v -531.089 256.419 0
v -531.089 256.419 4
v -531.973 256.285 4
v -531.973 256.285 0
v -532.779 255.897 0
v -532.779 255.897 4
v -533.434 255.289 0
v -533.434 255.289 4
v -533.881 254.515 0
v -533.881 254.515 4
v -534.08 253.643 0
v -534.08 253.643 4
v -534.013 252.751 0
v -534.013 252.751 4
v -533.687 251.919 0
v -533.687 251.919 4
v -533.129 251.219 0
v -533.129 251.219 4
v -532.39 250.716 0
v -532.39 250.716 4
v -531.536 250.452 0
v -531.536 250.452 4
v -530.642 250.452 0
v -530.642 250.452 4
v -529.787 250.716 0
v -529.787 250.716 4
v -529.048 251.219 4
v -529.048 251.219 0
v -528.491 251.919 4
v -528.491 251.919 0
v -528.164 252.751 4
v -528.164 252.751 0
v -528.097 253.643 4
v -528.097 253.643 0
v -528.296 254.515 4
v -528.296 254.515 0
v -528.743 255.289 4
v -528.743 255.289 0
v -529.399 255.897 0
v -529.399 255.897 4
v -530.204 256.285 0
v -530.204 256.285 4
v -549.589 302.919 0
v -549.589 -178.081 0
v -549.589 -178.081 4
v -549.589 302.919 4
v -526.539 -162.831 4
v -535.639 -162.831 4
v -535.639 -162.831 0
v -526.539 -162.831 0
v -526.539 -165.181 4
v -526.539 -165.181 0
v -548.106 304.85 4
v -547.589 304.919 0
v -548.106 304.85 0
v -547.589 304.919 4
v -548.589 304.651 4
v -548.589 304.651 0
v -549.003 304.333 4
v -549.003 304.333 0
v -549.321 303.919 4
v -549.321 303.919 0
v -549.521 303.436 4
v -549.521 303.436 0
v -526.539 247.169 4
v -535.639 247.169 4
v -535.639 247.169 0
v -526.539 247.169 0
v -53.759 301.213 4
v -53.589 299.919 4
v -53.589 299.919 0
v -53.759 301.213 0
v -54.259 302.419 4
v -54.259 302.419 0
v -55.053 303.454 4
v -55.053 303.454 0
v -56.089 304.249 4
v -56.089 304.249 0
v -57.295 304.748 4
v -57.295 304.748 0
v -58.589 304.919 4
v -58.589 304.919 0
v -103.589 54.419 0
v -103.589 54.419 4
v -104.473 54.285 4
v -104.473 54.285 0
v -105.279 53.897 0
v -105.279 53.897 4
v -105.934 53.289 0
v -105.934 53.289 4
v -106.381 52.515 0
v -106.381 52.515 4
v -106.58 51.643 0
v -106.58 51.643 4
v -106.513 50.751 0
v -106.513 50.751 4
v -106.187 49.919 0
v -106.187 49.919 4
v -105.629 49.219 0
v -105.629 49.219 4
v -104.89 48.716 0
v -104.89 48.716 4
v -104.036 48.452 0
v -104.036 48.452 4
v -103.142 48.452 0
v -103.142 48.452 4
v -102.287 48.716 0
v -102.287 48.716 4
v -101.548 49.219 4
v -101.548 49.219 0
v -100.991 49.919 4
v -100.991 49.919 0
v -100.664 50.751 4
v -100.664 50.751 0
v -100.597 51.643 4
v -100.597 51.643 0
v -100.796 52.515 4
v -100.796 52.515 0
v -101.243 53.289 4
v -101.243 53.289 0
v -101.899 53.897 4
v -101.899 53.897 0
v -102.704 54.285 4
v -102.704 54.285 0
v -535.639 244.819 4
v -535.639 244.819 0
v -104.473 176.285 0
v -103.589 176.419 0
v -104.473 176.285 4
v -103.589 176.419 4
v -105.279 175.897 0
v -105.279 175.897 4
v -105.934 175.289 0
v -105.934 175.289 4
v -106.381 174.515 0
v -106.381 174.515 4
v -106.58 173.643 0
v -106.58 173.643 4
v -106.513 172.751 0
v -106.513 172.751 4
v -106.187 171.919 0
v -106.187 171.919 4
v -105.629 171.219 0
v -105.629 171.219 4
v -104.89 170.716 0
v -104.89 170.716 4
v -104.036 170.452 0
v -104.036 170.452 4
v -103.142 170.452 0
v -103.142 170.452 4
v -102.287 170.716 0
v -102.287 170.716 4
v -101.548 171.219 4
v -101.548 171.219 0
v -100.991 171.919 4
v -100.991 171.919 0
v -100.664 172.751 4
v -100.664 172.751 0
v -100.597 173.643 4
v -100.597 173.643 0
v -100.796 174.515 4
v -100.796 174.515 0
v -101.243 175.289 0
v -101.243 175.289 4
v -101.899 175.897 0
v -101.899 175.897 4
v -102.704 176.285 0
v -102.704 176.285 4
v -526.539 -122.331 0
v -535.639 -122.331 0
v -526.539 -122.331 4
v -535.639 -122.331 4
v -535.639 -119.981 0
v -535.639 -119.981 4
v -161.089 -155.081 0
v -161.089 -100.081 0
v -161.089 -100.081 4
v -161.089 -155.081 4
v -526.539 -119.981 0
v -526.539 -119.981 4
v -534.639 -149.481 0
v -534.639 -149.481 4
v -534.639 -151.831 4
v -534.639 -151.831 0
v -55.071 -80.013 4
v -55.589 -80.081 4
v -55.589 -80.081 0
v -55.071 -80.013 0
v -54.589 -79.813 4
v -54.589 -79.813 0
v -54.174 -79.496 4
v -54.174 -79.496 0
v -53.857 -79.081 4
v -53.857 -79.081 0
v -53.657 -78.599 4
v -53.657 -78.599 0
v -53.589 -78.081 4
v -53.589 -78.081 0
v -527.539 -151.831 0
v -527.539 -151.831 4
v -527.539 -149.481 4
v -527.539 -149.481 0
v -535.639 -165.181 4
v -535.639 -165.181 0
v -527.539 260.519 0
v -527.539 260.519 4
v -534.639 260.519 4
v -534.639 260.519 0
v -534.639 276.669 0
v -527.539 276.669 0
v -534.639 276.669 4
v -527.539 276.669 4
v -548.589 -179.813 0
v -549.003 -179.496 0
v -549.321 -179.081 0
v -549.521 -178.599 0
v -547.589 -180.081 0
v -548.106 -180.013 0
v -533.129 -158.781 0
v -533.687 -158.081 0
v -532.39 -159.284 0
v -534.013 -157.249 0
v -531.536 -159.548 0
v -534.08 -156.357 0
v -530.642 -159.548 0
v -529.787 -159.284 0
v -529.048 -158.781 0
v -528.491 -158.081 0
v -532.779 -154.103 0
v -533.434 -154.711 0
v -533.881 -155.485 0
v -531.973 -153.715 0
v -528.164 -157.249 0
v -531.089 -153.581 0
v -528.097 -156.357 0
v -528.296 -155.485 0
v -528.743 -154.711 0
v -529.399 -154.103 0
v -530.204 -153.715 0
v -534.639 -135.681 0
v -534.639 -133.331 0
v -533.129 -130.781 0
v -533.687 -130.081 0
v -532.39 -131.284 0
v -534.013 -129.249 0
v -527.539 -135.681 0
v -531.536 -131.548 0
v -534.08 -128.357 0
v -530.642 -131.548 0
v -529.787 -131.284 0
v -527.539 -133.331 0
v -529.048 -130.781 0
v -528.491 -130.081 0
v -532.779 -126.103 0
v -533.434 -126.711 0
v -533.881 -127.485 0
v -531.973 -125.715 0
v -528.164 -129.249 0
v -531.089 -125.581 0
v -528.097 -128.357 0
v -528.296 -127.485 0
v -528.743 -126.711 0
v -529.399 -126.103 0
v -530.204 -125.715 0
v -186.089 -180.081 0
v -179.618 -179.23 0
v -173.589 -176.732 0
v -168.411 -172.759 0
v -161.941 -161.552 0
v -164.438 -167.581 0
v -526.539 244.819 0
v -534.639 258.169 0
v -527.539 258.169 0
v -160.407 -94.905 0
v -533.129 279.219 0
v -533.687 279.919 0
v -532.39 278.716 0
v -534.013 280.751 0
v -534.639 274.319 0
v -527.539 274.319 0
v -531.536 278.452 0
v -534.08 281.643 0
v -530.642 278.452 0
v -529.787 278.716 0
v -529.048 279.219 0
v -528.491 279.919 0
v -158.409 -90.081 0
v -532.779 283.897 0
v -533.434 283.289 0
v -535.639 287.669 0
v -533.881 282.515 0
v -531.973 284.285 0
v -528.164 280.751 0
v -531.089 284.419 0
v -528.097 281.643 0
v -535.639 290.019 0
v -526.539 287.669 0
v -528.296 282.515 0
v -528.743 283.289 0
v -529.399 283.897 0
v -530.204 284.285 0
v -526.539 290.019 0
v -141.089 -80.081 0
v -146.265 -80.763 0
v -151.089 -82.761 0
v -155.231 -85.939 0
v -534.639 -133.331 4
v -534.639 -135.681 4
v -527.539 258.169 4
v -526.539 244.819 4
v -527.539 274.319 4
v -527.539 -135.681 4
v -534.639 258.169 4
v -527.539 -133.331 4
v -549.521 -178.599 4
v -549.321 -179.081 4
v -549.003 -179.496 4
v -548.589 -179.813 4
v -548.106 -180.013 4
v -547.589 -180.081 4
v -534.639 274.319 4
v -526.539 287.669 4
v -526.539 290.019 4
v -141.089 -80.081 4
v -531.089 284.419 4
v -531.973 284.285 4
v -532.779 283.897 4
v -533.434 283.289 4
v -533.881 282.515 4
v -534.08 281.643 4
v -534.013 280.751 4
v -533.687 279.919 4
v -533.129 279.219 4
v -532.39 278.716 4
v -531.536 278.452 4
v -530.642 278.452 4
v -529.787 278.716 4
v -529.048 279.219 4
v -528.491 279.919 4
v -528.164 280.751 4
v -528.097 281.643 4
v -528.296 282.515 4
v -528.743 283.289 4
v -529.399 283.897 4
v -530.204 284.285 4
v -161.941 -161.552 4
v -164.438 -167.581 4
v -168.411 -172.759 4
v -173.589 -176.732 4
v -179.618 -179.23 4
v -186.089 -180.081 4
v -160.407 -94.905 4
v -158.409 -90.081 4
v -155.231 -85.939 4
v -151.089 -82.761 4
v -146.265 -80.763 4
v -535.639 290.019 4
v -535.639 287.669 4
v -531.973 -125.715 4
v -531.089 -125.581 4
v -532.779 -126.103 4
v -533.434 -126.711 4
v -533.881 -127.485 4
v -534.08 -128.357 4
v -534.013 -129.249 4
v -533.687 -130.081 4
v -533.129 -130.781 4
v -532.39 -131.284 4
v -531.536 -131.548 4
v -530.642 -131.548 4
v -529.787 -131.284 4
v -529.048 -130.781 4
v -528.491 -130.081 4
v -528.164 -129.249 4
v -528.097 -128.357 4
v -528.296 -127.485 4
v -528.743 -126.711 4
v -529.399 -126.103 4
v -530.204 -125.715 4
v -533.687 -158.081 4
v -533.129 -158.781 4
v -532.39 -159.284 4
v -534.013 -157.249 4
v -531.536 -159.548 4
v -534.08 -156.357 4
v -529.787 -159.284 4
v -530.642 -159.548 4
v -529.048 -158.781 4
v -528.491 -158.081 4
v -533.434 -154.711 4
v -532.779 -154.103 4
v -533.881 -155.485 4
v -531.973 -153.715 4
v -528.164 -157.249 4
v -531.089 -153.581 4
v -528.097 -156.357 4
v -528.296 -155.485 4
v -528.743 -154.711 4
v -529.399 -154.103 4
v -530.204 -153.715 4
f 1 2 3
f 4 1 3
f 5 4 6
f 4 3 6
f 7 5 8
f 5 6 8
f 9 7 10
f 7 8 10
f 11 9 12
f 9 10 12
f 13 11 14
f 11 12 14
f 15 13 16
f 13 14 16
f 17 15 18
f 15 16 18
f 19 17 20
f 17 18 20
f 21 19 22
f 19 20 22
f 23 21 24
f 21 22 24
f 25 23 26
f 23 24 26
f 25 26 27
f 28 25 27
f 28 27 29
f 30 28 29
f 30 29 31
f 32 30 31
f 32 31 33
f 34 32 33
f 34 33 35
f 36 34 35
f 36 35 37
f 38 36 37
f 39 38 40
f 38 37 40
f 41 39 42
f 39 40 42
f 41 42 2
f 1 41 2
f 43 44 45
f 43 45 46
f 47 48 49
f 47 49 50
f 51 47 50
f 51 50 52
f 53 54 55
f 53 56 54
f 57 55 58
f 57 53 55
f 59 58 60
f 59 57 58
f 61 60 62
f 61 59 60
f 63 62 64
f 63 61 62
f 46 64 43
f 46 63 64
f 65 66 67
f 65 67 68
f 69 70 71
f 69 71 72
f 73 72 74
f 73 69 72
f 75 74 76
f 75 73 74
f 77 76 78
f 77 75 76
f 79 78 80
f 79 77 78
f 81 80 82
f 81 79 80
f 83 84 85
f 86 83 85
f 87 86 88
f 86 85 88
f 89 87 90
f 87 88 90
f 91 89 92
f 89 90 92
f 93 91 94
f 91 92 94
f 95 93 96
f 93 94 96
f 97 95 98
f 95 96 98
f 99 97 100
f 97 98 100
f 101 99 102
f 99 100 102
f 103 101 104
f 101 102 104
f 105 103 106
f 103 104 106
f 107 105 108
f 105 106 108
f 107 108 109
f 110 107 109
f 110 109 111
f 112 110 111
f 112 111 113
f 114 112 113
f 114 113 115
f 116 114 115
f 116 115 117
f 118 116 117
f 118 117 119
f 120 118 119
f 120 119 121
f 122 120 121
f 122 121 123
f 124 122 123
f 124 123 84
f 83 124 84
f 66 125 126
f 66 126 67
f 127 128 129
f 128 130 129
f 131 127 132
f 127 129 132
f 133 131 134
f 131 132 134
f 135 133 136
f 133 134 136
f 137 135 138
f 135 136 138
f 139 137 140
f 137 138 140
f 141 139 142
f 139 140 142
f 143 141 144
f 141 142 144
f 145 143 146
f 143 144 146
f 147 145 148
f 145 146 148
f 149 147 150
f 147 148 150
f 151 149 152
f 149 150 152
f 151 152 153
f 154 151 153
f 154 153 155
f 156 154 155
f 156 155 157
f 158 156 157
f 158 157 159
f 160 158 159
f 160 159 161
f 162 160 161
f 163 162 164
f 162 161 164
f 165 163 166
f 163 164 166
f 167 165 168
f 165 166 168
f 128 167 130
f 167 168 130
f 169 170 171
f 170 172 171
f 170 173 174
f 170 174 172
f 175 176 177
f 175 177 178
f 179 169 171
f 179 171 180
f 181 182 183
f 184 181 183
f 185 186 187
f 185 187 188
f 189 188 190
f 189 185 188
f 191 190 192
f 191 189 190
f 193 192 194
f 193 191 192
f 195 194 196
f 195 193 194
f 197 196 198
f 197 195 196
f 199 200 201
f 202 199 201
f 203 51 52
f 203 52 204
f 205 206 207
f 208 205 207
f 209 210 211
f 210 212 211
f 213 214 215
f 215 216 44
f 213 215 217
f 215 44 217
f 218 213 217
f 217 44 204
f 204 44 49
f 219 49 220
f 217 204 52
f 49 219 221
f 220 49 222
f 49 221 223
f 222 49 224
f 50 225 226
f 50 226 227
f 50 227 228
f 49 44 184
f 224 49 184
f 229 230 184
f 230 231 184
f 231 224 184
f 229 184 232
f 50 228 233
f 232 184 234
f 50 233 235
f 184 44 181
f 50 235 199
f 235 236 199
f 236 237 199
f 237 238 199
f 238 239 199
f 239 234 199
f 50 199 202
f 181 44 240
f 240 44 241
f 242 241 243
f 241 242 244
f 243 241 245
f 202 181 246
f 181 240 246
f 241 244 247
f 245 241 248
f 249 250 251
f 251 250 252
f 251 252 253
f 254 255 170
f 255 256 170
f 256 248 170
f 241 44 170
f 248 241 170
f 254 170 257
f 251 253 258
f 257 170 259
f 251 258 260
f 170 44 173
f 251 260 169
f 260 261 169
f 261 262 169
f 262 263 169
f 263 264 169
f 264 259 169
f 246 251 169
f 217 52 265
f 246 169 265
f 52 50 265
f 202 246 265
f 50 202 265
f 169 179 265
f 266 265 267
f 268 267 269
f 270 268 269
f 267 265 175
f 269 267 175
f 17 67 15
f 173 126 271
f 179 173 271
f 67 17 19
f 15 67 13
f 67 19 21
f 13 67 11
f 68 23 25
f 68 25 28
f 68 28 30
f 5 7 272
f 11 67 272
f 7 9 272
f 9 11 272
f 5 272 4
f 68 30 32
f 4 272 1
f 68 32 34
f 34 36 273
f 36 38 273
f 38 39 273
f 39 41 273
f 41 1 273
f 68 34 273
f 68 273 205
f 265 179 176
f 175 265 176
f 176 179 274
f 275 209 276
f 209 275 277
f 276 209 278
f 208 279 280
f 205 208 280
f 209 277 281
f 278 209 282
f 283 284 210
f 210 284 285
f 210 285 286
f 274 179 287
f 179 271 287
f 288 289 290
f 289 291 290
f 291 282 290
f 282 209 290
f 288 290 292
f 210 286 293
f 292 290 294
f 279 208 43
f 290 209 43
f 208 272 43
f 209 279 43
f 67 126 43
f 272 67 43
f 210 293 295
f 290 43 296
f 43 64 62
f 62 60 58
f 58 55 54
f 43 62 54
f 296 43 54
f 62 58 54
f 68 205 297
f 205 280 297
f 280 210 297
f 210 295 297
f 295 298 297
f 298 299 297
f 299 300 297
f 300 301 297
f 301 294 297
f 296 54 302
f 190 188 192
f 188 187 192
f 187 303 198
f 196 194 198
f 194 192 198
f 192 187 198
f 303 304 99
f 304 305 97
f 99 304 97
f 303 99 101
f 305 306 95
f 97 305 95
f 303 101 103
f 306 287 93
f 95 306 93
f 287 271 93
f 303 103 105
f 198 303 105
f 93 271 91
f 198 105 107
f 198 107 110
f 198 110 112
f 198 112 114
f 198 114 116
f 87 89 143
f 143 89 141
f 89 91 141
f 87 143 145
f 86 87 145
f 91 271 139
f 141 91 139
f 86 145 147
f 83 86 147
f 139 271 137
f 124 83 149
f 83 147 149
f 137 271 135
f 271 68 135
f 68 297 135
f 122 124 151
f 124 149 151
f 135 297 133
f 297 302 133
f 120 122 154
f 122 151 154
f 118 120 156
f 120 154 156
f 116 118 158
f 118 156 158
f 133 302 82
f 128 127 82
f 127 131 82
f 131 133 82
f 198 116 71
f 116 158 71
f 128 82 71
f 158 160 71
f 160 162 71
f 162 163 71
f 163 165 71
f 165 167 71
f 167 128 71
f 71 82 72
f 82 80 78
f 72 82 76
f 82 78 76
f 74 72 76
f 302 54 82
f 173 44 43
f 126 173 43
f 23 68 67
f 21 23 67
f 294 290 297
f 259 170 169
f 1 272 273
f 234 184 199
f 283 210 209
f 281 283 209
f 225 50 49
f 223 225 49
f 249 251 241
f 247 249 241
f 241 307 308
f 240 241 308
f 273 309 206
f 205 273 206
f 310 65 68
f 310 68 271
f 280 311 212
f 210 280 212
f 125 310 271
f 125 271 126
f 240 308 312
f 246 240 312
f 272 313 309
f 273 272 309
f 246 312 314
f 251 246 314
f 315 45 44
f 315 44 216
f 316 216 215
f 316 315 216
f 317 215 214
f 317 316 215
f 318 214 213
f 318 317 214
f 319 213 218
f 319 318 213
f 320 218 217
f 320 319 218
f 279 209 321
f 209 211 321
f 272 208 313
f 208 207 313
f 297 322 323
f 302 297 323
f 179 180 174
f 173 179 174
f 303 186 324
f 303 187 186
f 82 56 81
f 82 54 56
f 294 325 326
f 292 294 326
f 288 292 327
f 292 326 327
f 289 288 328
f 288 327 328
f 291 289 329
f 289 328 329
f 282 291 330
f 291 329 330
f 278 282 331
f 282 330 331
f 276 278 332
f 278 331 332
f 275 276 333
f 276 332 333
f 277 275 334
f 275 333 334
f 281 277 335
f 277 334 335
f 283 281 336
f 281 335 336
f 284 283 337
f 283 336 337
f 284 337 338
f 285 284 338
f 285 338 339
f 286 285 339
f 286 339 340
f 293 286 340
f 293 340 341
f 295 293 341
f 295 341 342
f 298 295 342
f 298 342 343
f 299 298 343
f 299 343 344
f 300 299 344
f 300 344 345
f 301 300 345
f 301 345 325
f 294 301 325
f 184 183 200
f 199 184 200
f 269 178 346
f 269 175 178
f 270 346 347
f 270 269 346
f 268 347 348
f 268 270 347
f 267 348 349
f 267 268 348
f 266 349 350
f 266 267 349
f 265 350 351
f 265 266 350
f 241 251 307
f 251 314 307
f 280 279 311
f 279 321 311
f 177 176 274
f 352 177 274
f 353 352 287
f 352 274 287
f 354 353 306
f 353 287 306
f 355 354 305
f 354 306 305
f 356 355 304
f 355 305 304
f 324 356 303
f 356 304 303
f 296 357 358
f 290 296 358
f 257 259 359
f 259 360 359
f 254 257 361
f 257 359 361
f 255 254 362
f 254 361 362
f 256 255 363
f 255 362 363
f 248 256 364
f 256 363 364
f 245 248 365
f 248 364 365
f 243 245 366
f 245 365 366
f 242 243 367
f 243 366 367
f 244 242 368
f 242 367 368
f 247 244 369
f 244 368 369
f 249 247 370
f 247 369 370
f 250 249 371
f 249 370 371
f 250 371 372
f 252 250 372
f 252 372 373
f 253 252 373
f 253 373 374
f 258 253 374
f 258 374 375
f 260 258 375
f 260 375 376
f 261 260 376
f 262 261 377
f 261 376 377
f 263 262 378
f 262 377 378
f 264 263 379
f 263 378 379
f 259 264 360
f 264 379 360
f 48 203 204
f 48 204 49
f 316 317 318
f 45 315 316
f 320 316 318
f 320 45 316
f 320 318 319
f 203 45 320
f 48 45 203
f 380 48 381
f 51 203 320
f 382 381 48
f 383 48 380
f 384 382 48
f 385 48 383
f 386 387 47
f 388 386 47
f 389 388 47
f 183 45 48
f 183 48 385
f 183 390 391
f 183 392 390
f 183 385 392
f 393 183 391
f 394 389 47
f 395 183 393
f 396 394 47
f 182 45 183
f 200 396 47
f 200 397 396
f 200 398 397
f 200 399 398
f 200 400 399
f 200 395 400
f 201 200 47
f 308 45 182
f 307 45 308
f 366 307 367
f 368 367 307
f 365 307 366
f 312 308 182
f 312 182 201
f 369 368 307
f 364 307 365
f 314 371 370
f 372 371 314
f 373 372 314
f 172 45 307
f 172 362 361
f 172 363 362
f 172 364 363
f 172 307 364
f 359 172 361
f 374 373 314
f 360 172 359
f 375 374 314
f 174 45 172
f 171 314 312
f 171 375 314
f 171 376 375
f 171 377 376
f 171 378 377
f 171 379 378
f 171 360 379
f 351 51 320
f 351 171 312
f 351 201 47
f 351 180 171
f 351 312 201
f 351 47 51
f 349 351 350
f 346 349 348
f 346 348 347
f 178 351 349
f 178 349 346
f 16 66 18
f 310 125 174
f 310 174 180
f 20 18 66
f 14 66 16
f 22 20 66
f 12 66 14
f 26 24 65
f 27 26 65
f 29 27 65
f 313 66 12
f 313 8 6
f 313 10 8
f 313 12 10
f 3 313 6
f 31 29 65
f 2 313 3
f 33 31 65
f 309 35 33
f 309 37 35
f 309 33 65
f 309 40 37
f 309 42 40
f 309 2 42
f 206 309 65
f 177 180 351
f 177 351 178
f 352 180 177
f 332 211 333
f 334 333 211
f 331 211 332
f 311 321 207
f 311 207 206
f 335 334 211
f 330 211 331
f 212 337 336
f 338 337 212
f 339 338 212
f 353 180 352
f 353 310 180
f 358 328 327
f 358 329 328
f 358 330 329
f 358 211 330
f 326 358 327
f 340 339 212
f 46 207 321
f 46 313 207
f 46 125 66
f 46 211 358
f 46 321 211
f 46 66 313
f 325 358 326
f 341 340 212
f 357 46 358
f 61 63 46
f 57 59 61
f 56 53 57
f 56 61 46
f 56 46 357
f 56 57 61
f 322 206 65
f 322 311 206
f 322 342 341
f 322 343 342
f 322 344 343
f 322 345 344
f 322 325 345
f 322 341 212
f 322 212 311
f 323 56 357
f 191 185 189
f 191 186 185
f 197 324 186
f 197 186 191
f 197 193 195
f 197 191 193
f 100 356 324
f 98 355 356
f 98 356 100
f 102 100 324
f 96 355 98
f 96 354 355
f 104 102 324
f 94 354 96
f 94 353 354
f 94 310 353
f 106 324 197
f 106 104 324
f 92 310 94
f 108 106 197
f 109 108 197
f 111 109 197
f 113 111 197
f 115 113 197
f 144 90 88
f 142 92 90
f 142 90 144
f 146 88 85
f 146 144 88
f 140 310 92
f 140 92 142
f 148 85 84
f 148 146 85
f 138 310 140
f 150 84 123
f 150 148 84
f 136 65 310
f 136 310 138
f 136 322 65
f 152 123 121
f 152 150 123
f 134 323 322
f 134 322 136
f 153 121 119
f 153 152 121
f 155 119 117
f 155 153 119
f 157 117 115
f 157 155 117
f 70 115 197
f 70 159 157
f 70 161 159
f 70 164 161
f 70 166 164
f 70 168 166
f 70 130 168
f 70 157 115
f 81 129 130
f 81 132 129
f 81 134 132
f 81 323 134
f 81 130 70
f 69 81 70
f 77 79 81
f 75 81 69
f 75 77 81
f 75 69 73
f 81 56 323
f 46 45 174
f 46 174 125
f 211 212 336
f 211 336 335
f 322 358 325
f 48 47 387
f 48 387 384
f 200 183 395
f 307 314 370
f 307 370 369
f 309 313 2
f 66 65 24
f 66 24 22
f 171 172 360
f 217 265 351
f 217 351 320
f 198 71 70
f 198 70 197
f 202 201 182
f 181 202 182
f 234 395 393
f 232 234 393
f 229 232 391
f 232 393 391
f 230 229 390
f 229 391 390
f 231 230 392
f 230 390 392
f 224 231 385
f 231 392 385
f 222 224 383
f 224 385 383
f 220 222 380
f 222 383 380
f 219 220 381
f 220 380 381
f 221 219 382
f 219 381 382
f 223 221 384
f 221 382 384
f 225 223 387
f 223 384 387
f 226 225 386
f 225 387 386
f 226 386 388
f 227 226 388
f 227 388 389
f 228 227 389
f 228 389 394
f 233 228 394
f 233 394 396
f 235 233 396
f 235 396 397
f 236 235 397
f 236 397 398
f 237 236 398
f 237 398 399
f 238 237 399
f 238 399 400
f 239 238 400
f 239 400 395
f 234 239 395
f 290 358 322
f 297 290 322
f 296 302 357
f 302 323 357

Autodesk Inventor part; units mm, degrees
ref_plane "YZ Plane" through (0, 0, 0) normal (1, 0, 0) x (0, 1, 0)
ref_plane "XZ Plane" through (0, 0, 0) normal (0, 1, 0) x (-1, 0, 0)
ref_plane "XY Plane" through (0, 0, 0) normal (0, 0, 1) x (1, 0, 0)
sketch "Szkic1" plane through (0, 0, 0) normal (0, 0, 1) x (1, 0, 0)
  line L0 (-549.5887, -180.0814) -> (-549.5887, 304.9186)
  line L1 (-549.5887, 304.9186) -> (-53.5887, 304.9186)
  line L2 (-53.5887, 304.9186) -> (-53.5887, -80.0814)
  line L3 (-53.5887, -80.0814) -> (-141.0887, -80.0814)
  line L4 (-161.0887, -100.0814) -> (-161.0887, -155.0814)
  line L5 (-186.0887, -180.0814) -> (-549.5887, -180.0814)
  arc A0 (-141.0887, -80.0814) -> (-161.0887, -100.0814) centre (-141.0887, -100.0814) ccw
  arc A1 (-186.0887, -180.0814) -> (-161.0887, -155.0814) centre (-186.0887, -155.0814) ccw
  point P0 (0, 0)
  point P1 (-161.0887, -80.0814)
  point P2 (-161.0887, -180.0814)
  point P3 (-531.0887, 281.4186)
  point P4 (-531.0887, 253.4186)
  point P5 (-531.0887, -128.5814)
  point P6 (-531.0887, -156.5814)
  point P7 (-103.5887, 173.4186)
  point P8 (-103.5887, 51.4186)
  dimension "d0" = 485
  dimension "d1" = 496
  dimension "d2" = 107.5
  dimension "d3" = 100
  dimension "d6" = 20
  dimension "d7" = 25
  dimension "d8" = 28
  dimension "d9" = 23.5
  dimension "d11" = 28
  dimension "d12" = 23.5
  dimension "d13" = 18.5
  dimension "d14" = 18.5
  dimension "d17" = 18.5
  dimension "d18" = 18.5
  dimension "d31" = 385
  dimension "d32" = 122
  dimension "d33" = 131.5
  dimension "d34" = 50
  dimension "d35" = 50
extrude "Wyciągnięcie proste1" add sketch "Szkic1" along normal blind 4
hole "Otwór1" at (-531.0887, 281.4186, 0) at (-531.0887, 253.4186, 0) at (-531.0887, -128.5814, 0) at (-531.0887, -156.5814, 0) direction (0, 0, 1) diameter 6 end through all
fillet "Zaokrąglenie2" radius 2 2 edges at (-53.5887, -80.0814, 2) (-549.5887, -180.0814, 2)
fillet "Zaokrąglenie2" radius 2 1 edges at (-549.5887, 304.9186, 2)
fillet "Zaokrąglenie2" radius 5 1 edges at (-53.5887, 304.9186, 2)
hole "Otwór2" at (-103.5887, 173.4186, 0) at (-103.5887, 51.4186, 0) direction (0, 0, 1) diameter 6 end through all
sketch "Szkic2" plane through (0, 0, 4) normal (0, 0, 1) x (1, 0, 0)
  circle A0 centre (-103.5887, 173.4186) radius 3 projected
  circle A1 centre (-103.5887, 51.4186) radius 3 projected
  arc A2 (-53.5887, 299.9186) -> (-58.5887, 304.9186) centre (-58.5887, 299.9186) ccw projected
  line L0 (-58.5887, 304.9186) -> (-547.5887, 304.9186) projected
  arc A3 (-547.5887, 304.9186) -> (-549.5887, 302.9186) centre (-547.5887, 302.9186) ccw projected
  line L1 (-549.5887, 302.9186) -> (-549.5887, -178.0814) projected
  arc A4 (-549.5887, -178.0814) -> (-547.5887, -180.0814) centre (-547.5887, -178.0814) ccw projected
  line L2 (-547.5887, -180.0814) -> (-186.0887, -180.0814) projected
  arc A5 (-186.0887, -180.0814) -> (-161.0887, -155.0814) centre (-186.0887, -155.0814) ccw projected
  line L3 (-161.0887, -155.0814) -> (-161.0887, -100.0814) projected
  arc A6 (-141.0887, -80.0814) -> (-161.0887, -100.0814) centre (-141.0887, -100.0814) ccw projected
  line L4 (-141.0887, -80.0814) -> (-55.5887, -80.0814) projected
  arc A7 (-55.5887, -80.0814) -> (-53.5887, -78.0814) centre (-55.5887, -78.0814) ccw projected
  line L5 (-53.5887, -78.0814) -> (-53.5887, 299.9186) projected
  circle A8 centre (-531.0887, -128.5814) radius 3 projected
  circle A9 centre (-531.0887, 281.4186) radius 3 projected
  circle A10 centre (-531.0887, 253.4186) radius 3 projected
  circle A11 centre (-531.0887, -156.5814) radius 3 projected
  line L6 (-535.1387, 289.5186) -> (-527.0387, 289.5186)
  line L7 (-527.0387, 289.5186) -> (-527.0387, 288.1686)
  line L8 (-527.0387, 288.1686) -> (-535.1387, 288.1686)
  line L9 (-535.1387, 288.1686) -> (-535.1387, 289.5186)
  line L10 (-534.1387, 276.1686) -> (-528.0387, 276.1686)
  line L11 (-528.0387, 276.1686) -> (-528.0387, 274.8186)
  line L12 (-528.0387, 274.8186) -> (-534.1387, 274.8186)
  line L13 (-534.1387, 274.8186) -> (-534.1387, 276.1686)
  line L14 (-534.1387, 260.0186) -> (-528.0387, 260.0186)
  line L15 (-528.0387, 260.0186) -> (-528.0387, 258.6686)
  line L16 (-528.0387, 258.6686) -> (-534.1387, 258.6686)
  line L17 (-534.1387, 258.6686) -> (-534.1387, 260.0186)
  line L18 (-535.1387, 245.3186) -> (-527.0387, 245.3186)
  line L19 (-527.0387, 245.3186) -> (-527.0387, 246.6686)
  line L20 (-527.0387, 246.6686) -> (-535.1387, 246.6686)
  line L21 (-535.1387, 246.6686) -> (-535.1387, 245.3186)
  line L22 (-535.6387, 287.6686) -> (-526.5387, 287.6686)
  line L23 (-526.5387, 287.6686) -> (-526.5387, 290.0186)
  line L24 (-526.5387, 290.0186) -> (-535.6387, 290.0186)
  line L25 (-535.6387, 290.0186) -> (-535.6387, 287.6686)
  line L26 (-534.6387, 274.3186) -> (-527.5387, 274.3186)
  line L27 (-527.5387, 274.3186) -> (-527.5387, 276.6686)
  line L28 (-527.5387, 276.6686) -> (-534.6387, 276.6686)
  line L29 (-534.6387, 276.6686) -> (-534.6387, 274.3186)
  line L30 (-534.6387, 258.1686) -> (-527.5387, 258.1686)
  line L31 (-527.5387, 258.1686) -> (-527.5387, 260.5186)
  line L32 (-527.5387, 260.5186) -> (-534.6387, 260.5186)
  line L33 (-534.6387, 260.5186) -> (-534.6387, 258.1686)
  line L34 (-535.6387, 247.1686) -> (-526.5387, 247.1686)
  line L35 (-526.5387, 247.1686) -> (-526.5387, 244.8186)
  line L36 (-526.5387, 244.8186) -> (-535.6387, 244.8186)
  line L37 (-535.6387, 244.8186) -> (-535.6387, 247.1686)
  line L38 (-535.1387, -120.4814) -> (-527.0387, -120.4814)
  line L39 (-527.0387, -120.4814) -> (-527.0387, -121.8314)
  line L40 (-527.0387, -121.8314) -> (-535.1387, -121.8314)
  line L41 (-535.1387, -121.8314) -> (-535.1387, -120.4814)
  line L42 (-534.1387, -133.8314) -> (-528.0387, -133.8314)
  line L43 (-528.0387, -133.8314) -> (-528.0387, -135.1814)
  line L44 (-528.0387, -135.1814) -> (-534.1387, -135.1814)
  line L45 (-534.1387, -135.1814) -> (-534.1387, -133.8314)
  line L46 (-534.1387, -149.9814) -> (-528.0387, -149.9814)
  line L47 (-528.0387, -149.9814) -> (-528.0387, -151.3314)
  line L48 (-528.0387, -151.3314) -> (-534.1387, -151.3314)
  line L49 (-534.1387, -151.3314) -> (-534.1387, -149.9814)
  line L50 (-535.1387, -164.6814) -> (-527.0387, -164.6814)
  line L51 (-527.0387, -164.6814) -> (-527.0387, -163.3314)
  line L52 (-527.0387, -163.3314) -> (-535.1387, -163.3314)
  line L53 (-535.1387, -163.3314) -> (-535.1387, -164.6814)
  line L54 (-535.6387, -122.3314) -> (-526.5387, -122.3314)
  line L55 (-526.5387, -122.3314) -> (-526.5387, -119.9814)
  line L56 (-526.5387, -119.9814) -> (-535.6387, -119.9814)
  line L57 (-535.6387, -119.9814) -> (-535.6387, -122.3314)
  line L58 (-534.6387, -135.6814) -> (-527.5387, -135.6814)
  line L59 (-527.5387, -135.6814) -> (-527.5387, -133.3314)
  line L60 (-527.5387, -133.3314) -> (-534.6387, -133.3314)
  line L61 (-534.6387, -133.3314) -> (-534.6387, -135.6814)
  line L62 (-534.6387, -151.8314) -> (-527.5387, -151.8314)
  line L63 (-527.5387, -151.8314) -> (-527.5387, -149.4814)
  line L64 (-527.5387, -149.4814) -> (-534.6387, -149.4814)
  line L65 (-534.6387, -149.4814) -> (-534.6387, -151.8314)
  line L66 (-535.6387, -162.8314) -> (-526.5387, -162.8314)
  line L67 (-526.5387, -162.8314) -> (-526.5387, -165.1814)
  line L68 (-526.5387, -165.1814) -> (-535.6387, -165.1814)
  line L69 (-535.6387, -165.1814) -> (-535.6387, -162.8314)
  point P0 (0, 0)
  dimension "d43" = 8.1
  dimension "d44" = 1.35
  dimension "d45" = 6.1
  dimension "d46" = 1.35
  dimension "d47" = 6.1
  dimension "d48" = 1.35
  dimension "d49" = 8.1
  dimension "d50" = 1.35
  dimension "d51" = 4.05
  dimension "d52" = 3.05
  dimension "d53" = 3.05
  dimension "d54" = 4.05
  dimension "d55" = 8.1
  dimension "d56" = 8.1
  dimension "d57" = 6.6
  dimension "d59" = 44.2
  dimension "d60" = 17.5
  dimension "d61" = 14.8
  dimension "d62" = 6.6
  dimension "d63" = 0.5
  dimension "d64" = 0.5
  dimension "d65" = 0.5
  dimension "d66" = 0.5
  dimension "d69" = 8.1
  dimension "d70" = 1.35
  dimension "d71" = 6.1
  dimension "d72" = 1.35
  dimension "d73" = 6.1
  dimension "d74" = 1.35
  dimension "d75" = 8.1
  dimension "d76" = 1.35
  dimension "d77" = 44.2
  dimension "d78" = 17.5
  dimension "d79" = 14.8
  dimension "d80" = 0.5
  dimension "d81" = 0.5
  dimension "d82" = 0.5
  dimension "d83" = 0.5
  dimension "d84" = 8.1
  dimension "d85" = 6.6
  dimension "d86" = 6.6
  dimension "d87" = 8.1
  dimension "d88" = 3.05
  dimension "d89" = 4.05
  dimension "d90" = 4.05
  dimension "d91" = 3.05
extrude "Wyciągnięcie proste2" cut sketch "Szkic2" against normal through all contours L6 L7 L8 L9 | L10 L11 L12 L13 | L14 L15 L16 L17 | L21 L20 L19 L18 | L25 L24 L23 L22 | L29 L28 L27 L26 | L33 L32 L31 L30 | L34 L35 L36 L37 | L38 L39 L40 L41 | L42 L43 L44 L45 | L46 L47 L48 L49 | L53 L52 L51 L50 | L57 L56 L55 L54 | L61 L60 L59 L58 | L65 L64 L63 L62 | L66 L67 L68 L69
equation "\"d11\" = d8"
equation "\"d12\" = d9"
equation "\"d14\" = d13"
equation "\"d17\" = d13"
equation "\"d18\" = d13"
equation "\"d33\" = -0.5 * d32 + 0.5 * d31"
equation "\"d34\" = d35"
equation "\"d51\" = 0.5 * d43"
equation "\"d52\" = 0.5 * d45"
equation "\"d53\" = 0.5 * d47"
equation "\"d54\" = 0.5 * d49"
equation "\"d64\" = d63"
equation "\"d65\" = d63"
equation "\"d66\" = d63"
equation "\"d80\" = d63"
equation "\"d81\" = d80"
equation "\"d82\" = d80"
equation "\"d83\" = d80"
properties part number "LC_PLEXI_4mm_Front_Door"
